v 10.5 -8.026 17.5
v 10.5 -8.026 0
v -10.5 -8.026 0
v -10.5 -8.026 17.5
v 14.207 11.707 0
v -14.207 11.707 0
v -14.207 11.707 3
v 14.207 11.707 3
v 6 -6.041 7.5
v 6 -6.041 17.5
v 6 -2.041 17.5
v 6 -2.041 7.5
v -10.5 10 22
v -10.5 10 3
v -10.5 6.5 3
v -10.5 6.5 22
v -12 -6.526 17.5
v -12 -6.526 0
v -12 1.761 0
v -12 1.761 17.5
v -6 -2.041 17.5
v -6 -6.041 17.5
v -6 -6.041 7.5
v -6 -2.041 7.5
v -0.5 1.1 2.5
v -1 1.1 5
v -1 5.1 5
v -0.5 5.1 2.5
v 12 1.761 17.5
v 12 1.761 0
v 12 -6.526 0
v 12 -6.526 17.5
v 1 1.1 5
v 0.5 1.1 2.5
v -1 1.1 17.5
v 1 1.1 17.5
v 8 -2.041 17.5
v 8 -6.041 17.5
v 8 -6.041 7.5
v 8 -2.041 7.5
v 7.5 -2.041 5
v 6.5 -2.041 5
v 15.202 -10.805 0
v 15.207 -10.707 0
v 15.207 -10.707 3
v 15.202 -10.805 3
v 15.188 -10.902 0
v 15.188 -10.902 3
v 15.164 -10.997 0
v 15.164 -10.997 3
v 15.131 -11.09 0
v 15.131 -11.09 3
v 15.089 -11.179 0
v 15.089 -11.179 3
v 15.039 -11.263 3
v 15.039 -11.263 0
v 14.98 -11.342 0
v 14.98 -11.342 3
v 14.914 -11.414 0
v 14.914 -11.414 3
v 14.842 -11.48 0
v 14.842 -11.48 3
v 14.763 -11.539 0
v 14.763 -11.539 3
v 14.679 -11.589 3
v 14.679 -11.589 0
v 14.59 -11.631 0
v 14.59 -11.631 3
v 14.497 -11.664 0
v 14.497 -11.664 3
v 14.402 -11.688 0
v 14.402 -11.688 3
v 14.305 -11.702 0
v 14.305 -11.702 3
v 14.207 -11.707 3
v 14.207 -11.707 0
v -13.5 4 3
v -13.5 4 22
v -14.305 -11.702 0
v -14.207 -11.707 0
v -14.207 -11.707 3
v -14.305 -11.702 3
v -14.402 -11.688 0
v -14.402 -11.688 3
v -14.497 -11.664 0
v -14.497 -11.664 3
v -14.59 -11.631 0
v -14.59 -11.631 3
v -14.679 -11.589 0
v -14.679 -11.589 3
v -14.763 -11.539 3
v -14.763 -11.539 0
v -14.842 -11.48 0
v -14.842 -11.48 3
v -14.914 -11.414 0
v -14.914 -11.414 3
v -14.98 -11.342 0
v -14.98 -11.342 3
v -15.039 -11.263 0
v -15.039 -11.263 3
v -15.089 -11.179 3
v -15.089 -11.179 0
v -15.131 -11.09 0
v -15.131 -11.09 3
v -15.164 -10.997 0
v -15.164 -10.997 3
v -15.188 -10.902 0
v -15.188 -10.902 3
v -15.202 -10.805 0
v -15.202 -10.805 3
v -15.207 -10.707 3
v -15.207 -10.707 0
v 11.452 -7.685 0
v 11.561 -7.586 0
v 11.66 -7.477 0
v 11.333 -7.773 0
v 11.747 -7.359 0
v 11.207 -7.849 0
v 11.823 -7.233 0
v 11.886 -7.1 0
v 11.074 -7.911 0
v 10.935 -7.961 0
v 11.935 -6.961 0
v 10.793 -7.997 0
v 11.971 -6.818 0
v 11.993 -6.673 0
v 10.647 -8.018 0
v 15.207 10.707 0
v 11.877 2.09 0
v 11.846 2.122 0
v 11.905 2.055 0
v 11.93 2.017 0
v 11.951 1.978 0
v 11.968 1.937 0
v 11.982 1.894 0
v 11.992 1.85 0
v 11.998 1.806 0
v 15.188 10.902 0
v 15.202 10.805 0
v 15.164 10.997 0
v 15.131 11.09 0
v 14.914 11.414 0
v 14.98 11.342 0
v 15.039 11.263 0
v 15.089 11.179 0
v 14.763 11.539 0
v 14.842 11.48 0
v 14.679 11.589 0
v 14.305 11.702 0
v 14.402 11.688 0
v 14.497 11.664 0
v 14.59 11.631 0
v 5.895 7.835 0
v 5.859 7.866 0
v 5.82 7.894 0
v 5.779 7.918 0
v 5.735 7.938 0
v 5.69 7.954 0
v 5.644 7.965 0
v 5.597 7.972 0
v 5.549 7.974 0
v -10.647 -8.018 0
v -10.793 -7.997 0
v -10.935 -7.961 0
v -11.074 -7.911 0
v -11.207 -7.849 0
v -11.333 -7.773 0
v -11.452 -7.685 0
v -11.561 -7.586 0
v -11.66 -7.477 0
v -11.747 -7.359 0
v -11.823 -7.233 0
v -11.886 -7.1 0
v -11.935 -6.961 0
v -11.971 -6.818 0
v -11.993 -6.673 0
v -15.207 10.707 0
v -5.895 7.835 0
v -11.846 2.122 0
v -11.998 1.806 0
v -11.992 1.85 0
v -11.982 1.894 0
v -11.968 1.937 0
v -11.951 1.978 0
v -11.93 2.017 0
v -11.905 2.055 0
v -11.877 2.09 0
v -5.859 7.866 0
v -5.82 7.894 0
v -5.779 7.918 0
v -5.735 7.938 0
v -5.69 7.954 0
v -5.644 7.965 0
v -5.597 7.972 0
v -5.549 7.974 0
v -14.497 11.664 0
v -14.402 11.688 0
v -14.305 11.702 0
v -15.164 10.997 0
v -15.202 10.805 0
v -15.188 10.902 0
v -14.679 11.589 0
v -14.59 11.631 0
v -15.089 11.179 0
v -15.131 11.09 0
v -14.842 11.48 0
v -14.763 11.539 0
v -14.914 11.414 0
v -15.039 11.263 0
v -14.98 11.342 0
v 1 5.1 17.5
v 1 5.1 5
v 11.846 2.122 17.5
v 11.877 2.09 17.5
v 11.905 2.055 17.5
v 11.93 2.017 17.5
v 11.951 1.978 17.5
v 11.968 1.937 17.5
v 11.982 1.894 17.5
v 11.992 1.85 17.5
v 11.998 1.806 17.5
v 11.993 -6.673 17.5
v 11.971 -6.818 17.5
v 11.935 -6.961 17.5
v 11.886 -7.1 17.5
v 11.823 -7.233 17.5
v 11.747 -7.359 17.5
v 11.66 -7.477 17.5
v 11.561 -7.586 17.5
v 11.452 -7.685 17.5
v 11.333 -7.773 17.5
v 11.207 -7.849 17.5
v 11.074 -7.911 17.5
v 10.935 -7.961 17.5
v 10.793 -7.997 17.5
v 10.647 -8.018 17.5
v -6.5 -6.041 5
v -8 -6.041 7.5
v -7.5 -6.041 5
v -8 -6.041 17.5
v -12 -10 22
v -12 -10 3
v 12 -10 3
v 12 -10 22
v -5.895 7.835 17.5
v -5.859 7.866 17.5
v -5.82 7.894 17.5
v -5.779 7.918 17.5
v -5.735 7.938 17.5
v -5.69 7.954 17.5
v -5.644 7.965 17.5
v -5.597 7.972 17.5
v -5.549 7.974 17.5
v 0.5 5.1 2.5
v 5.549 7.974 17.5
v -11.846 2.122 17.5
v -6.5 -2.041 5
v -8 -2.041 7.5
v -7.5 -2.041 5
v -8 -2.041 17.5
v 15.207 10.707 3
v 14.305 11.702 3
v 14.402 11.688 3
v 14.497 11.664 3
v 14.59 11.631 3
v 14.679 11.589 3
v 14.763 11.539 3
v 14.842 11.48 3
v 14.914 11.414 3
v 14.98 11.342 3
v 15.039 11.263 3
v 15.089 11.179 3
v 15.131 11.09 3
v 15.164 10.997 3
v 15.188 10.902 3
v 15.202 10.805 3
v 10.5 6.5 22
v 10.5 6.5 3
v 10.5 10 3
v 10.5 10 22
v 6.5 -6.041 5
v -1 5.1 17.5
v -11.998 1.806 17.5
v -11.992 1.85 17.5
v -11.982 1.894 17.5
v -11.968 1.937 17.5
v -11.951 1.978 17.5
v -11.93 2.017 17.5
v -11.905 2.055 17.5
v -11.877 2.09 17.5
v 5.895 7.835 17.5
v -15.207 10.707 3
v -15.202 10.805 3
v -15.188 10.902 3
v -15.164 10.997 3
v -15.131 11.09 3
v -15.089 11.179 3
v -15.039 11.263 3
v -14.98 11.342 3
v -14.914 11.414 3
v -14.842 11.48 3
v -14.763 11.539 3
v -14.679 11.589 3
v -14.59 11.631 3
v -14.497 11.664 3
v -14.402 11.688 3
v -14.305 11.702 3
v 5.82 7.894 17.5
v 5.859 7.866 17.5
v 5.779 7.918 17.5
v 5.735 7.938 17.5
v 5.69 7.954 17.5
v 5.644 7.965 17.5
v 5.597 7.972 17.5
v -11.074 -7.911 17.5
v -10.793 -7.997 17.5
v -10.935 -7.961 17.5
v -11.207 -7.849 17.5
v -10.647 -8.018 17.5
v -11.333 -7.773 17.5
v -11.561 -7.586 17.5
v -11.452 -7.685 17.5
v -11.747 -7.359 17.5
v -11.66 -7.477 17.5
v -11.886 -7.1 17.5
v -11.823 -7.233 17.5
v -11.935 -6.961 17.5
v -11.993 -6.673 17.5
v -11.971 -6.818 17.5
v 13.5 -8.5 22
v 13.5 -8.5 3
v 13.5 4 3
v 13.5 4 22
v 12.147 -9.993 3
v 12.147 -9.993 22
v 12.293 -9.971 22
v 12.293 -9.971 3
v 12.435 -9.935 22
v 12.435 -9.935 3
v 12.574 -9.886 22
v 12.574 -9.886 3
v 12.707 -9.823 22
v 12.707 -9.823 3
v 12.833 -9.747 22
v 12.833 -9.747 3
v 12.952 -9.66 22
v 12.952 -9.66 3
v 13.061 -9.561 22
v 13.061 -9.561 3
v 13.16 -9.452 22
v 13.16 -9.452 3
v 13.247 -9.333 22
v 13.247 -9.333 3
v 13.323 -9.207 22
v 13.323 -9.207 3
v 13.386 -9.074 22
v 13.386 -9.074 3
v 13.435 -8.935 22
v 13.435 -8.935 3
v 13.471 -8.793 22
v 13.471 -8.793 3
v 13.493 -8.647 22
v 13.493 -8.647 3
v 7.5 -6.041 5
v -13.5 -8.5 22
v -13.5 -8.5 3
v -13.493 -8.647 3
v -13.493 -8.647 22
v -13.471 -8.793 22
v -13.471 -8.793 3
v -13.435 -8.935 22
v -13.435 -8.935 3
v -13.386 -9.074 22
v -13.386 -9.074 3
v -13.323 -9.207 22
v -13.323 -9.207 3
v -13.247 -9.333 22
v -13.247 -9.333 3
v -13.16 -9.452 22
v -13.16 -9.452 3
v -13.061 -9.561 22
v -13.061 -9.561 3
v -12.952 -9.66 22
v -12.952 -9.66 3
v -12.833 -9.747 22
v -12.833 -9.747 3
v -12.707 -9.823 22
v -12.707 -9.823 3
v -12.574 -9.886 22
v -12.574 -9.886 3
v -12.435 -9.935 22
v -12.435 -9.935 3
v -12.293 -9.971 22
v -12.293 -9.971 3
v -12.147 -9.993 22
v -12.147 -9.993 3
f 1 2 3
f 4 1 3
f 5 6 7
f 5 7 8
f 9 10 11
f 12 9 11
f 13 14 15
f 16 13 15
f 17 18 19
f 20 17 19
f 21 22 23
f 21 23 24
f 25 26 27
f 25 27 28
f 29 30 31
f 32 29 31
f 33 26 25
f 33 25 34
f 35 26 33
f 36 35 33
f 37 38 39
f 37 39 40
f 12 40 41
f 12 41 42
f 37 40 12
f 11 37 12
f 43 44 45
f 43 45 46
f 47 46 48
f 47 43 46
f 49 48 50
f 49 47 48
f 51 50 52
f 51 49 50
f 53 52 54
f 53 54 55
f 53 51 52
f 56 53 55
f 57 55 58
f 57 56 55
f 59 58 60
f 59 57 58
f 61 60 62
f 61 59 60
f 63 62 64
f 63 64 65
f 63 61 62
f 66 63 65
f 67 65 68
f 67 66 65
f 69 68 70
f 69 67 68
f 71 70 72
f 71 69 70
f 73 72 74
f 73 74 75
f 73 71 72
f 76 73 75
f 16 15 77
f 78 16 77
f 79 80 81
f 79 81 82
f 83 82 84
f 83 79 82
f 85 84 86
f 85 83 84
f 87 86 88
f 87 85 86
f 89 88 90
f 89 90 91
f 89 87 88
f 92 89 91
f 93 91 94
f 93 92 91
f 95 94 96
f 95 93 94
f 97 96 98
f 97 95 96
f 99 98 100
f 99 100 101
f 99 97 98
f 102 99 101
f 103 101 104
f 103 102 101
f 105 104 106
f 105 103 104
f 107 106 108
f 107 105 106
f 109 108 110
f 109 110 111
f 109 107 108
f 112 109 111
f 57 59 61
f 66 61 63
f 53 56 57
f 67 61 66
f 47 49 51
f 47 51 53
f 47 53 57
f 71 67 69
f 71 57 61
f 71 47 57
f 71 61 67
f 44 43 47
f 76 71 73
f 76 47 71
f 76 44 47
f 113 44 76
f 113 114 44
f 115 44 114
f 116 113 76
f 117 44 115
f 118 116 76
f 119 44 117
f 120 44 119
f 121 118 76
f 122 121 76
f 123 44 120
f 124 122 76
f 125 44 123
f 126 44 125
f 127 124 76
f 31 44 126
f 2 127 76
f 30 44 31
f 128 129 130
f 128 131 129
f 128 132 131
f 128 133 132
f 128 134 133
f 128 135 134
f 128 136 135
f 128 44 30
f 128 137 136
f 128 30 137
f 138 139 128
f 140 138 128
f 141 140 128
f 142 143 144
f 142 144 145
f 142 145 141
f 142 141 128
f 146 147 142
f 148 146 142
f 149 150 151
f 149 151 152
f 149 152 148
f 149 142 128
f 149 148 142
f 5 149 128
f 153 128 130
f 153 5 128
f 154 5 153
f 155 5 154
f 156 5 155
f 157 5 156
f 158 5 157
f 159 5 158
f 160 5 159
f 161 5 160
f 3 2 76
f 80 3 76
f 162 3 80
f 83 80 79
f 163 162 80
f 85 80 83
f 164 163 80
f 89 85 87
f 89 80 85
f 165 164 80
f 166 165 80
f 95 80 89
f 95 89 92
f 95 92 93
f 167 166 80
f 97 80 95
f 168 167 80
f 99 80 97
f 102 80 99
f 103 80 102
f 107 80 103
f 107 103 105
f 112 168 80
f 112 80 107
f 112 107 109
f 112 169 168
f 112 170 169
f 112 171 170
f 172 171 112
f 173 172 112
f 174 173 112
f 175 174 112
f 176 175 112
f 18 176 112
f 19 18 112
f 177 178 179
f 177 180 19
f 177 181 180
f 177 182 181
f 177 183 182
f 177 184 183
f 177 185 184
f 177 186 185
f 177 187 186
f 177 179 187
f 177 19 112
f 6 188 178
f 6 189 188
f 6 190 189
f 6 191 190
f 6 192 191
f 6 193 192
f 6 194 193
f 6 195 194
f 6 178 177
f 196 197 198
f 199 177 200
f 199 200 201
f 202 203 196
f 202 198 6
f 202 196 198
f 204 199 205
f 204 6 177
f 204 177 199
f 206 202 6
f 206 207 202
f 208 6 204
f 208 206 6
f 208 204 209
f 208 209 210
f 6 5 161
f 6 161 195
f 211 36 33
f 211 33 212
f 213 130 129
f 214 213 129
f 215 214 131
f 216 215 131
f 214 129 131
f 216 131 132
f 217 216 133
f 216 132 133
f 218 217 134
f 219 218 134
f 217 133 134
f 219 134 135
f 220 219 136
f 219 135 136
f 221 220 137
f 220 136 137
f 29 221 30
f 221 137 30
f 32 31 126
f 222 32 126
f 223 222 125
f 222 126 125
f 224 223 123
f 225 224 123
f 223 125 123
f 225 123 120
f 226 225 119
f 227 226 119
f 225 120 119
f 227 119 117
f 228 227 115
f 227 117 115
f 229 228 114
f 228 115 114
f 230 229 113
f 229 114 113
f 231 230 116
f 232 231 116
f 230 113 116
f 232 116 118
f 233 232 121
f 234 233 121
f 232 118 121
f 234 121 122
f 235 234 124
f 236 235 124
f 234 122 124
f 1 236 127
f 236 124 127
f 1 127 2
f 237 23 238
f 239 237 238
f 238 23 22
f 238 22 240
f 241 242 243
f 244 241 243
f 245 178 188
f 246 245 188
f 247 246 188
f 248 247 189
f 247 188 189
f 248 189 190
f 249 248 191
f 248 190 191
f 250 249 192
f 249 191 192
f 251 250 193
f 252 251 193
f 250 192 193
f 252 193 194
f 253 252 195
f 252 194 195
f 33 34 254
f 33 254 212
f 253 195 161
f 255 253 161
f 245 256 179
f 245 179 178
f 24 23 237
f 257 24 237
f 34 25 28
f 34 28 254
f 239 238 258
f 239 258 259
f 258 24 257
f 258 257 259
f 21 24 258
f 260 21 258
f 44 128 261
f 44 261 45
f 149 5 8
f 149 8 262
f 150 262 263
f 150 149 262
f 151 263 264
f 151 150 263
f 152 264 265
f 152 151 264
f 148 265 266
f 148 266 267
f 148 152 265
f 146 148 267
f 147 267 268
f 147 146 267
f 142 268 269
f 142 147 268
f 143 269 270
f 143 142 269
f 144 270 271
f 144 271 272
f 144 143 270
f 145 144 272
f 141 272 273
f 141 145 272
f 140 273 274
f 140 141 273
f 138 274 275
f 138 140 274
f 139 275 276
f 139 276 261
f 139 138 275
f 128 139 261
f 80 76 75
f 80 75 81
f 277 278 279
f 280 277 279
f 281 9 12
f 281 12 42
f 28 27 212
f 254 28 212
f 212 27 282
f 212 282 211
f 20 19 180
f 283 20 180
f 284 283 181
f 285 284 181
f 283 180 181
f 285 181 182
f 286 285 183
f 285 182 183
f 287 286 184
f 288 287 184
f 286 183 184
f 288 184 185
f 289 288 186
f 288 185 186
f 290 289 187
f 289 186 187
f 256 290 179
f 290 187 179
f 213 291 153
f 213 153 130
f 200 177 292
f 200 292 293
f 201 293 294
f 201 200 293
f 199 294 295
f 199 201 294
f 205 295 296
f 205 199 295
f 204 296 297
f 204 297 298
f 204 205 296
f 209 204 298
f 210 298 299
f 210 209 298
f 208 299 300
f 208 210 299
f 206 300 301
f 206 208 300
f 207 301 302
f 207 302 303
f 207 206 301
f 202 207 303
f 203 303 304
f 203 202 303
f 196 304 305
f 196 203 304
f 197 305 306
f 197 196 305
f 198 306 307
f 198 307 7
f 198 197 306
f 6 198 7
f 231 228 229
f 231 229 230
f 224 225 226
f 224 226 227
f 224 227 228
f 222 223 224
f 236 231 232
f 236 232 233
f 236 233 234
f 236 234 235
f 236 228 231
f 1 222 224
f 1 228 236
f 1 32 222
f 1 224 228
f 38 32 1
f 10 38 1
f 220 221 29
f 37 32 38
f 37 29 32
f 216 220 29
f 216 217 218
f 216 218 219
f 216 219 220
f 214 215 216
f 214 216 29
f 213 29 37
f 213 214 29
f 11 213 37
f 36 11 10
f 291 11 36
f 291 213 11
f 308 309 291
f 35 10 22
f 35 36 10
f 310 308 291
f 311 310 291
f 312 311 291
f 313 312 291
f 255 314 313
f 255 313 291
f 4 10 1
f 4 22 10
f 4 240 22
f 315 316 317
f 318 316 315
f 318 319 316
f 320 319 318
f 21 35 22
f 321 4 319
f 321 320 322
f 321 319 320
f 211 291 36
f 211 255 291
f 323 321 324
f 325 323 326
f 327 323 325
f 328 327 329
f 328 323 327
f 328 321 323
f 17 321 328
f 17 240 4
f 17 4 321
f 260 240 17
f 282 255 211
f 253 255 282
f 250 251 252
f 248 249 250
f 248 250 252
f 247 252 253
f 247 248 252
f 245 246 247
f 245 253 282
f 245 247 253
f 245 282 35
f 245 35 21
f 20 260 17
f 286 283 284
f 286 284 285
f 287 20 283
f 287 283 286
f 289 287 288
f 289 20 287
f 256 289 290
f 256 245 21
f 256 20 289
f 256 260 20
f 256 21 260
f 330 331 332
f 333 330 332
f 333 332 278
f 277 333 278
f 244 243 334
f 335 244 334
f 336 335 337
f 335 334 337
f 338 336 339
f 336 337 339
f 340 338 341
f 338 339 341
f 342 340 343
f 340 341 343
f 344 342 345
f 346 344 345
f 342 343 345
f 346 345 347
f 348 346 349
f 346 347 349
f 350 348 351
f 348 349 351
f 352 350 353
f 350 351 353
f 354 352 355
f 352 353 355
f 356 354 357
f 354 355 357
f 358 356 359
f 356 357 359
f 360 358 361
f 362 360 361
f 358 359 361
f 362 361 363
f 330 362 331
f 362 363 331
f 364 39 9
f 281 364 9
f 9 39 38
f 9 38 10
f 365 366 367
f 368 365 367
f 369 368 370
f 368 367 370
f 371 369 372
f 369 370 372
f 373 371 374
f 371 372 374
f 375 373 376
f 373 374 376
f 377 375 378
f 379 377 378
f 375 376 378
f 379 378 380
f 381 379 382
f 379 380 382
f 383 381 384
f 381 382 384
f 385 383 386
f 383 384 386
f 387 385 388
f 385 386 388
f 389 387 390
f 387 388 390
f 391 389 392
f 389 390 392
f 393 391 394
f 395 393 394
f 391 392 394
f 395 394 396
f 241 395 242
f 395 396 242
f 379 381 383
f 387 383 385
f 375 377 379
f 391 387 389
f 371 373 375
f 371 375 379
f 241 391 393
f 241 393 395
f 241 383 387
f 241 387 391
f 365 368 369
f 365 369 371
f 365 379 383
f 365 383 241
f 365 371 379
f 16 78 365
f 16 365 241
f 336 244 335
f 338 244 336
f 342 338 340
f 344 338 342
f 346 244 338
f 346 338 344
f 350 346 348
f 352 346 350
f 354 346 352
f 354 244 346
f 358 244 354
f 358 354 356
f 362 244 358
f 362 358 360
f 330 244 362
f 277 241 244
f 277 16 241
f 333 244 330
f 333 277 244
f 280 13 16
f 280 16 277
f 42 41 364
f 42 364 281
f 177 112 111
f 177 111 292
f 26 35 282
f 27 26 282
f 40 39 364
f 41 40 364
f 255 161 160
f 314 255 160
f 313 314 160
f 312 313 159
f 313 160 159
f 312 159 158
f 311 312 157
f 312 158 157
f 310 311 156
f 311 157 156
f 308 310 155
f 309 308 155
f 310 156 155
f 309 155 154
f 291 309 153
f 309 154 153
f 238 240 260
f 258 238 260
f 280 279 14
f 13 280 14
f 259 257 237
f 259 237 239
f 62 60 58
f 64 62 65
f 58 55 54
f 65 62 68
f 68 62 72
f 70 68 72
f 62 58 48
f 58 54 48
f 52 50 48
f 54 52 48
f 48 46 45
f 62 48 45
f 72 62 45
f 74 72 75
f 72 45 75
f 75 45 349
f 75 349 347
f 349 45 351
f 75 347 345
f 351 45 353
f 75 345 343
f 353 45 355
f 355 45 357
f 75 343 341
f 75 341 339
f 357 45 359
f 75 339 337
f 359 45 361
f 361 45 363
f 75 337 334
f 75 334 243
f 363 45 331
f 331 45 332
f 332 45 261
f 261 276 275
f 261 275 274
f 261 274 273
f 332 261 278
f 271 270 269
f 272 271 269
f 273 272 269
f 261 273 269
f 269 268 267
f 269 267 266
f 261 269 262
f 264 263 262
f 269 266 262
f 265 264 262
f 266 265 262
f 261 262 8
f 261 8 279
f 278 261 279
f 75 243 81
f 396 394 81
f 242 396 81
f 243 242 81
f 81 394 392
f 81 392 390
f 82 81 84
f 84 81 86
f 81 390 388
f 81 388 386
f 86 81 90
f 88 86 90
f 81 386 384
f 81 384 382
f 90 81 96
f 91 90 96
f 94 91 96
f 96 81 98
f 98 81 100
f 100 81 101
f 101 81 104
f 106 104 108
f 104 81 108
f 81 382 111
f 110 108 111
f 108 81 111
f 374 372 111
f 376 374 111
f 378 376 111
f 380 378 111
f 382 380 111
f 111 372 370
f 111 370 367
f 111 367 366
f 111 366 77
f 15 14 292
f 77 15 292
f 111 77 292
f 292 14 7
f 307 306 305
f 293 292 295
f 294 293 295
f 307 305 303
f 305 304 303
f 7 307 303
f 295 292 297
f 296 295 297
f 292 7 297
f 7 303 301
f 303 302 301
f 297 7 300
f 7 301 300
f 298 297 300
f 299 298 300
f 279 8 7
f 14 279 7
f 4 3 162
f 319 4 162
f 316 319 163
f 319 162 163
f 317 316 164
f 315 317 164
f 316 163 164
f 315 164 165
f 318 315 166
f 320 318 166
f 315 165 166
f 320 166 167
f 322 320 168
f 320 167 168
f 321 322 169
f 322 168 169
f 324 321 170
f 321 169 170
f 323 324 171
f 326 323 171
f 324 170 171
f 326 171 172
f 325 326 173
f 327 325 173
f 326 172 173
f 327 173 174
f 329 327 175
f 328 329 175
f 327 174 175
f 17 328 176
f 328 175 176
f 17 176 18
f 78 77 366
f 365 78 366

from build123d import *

# Parameters (mm, degrees)
EXTRUDE_1_DEPTH     = 3
EXTRUDE_2_DEPTH     = 19
CUT_EXTRUDE_1_DEPTH = 17.5
SKETCH_4_W          = 2
SKETCH_4_H          = 4
EXTRUDE_3_DEPTH     = 12.5
EXTRUDE_4_DEPTH     = 4
CUT_EXTRUDE_2_DEPTH = 4


with BuildPart() as part:
    # 草图1 → 凸台-拉伸1 (new body)
    with BuildSketch(Plane.XY):
        with BuildLine():
            Line((-14.207106781, 11.707106781), (14.207106781, 11.707106781))
            ThreePointArc((14.207106781, 11.707106781), (14.914213562, 11.414213562), (15.207106781, 10.707106781))
            Line((15.207106781, 10.707106781), (15.207106781, -10.707106781))
            ThreePointArc((15.207106781, -10.707106781), (14.914213562, -11.414213562), (14.207106781, -11.707106781))
            Line((14.207106781, -11.707106781), (-14.207106781, -11.707106781))
            ThreePointArc((-14.207106781, -11.707106781), (-14.914213562, -11.414213562), (-15.207106781, -10.707106781))
            Line((-15.207106781, -10.707106781), (-15.207106781, 10.707106781))
            ThreePointArc((-15.207106781, 10.707106781), (-14.914213562, 11.414213562), (-14.207106781, 11.707106781))
        make_face()
    extrude(amount=EXTRUDE_1_DEPTH)

    # 草图2 → 凸台-拉伸2 (add)
    with BuildSketch(Plane.XY.offset(3)):
        with BuildLine():
            Line((-10.5, 10), (-10.5, 6.5))
            Line((-10.5, 6.5), (-13.5, 4))
            Line((-13.5, 4), (-13.5, -8.5))
            ThreePointArc((-13.5, -8.5), (-13.060660172, -9.560660172), (-12, -10))
            Line((-12, -10), (12, -10))
            ThreePointArc((12, -10), (13.060660172, -9.560660172), (13.5, -8.5))
            Line((13.5, -8.5), (13.5, 4))
            Line((13.5, 4), (10.5, 6.5))
            Line((10.5, 6.5), (10.5, 10))
            Line((10.5, 10), (-10.5, 10))
        make_face()
    extrude(amount=EXTRUDE_2_DEPTH)

    # 草图3 → 切除-拉伸1 (cut)
    with BuildSketch(Plane(origin=(0, 0, 0), x_dir=(-1, 0, 0), z_dir=(0, 0, -1))):
        with BuildLine():
            Line((12, -6.525638569), (12, 1.761252493))
            ThreePointArc((12, 1.761252493), (11.959963562, 1.957297186), (11.846265914, 2.121946154))
            Line((11.846265914, 2.121946154), (5.89511077, 7.835055092))
            ThreePointArc((5.89511077, 7.835055092), (5.735463679, 7.938229317), (5.548844856, 7.974361431))
            Line((5.548844856, 7.974361431), (-5.548844856, 7.974361431))
            ThreePointArc((-5.548844856, 7.974361431), (-5.735463679, 7.938229317), (-5.89511077, 7.835055092))
            Line((-5.89511077, 7.835055092), (-11.846265914, 2.121946154))
            ThreePointArc((-11.846265914, 2.121946154), (-11.959963562, 1.957297186), (-12, 1.761252493))
            Line((-12, 1.761252493), (-12, -6.525638569))
            ThreePointArc((-12, -6.525638569), (-11.560660172, -7.58629874), (-10.5, -8.025638569))
            Line((-10.5, -8.025638569), (10.5, -8.025638569))
            ThreePointArc((10.5, -8.025638569), (11.560660172, -7.58629874), (12, -6.525638569))
        make_face()
    extrude(amount=-CUT_EXTRUDE_1_DEPTH, mode=Mode.SUBTRACT)

    # 草图4 → 凸台-拉伸3 (add)
    with BuildSketch(Plane(origin=(0, 0, 17.5), x_dir=(-1, 0, 0), z_dir=(0, 0, -1))):
        with Locations((-7, -4.041451884)):
            Rectangle(SKETCH_4_W, SKETCH_4_H)
        with Locations((0, 3.099976544)):
            Rectangle(SKETCH_4_W, SKETCH_4_H)
        with Locations((7, -4.041451884)):
            Rectangle(SKETCH_4_W, SKETCH_4_H)
    extrude(amount=EXTRUDE_3_DEPTH)

    # 草图5 → 凸台-拉伸4 (add)
    with BuildSketch(Plane.XZ.offset(-1.099976544)):
        Polygon((1, 5), (-1, 5), (-0.5, 2.5), (0.5, 2.5), align=None)
    extrude(amount=-EXTRUDE_4_DEPTH)

    # 草图6 → 切除-拉伸2 (cut)
    with BuildSketch(Plane.XZ.offset(6.041451884)):
        Polygon((8, 5), (8, 7.5), (7.5, 5), align=None)
        Polygon((6.5, 5), (6, 5), (6, 7.5), align=None)
        Polygon((-6, 5), (-6, 7.5), (-6.5, 5), align=None)
        Polygon((-7.5, 5), (-8, 5), (-8, 7.5), align=None)
    extrude(amount=-CUT_EXTRUDE_2_DEPTH, mode=Mode.SUBTRACT)


solid = part.part
